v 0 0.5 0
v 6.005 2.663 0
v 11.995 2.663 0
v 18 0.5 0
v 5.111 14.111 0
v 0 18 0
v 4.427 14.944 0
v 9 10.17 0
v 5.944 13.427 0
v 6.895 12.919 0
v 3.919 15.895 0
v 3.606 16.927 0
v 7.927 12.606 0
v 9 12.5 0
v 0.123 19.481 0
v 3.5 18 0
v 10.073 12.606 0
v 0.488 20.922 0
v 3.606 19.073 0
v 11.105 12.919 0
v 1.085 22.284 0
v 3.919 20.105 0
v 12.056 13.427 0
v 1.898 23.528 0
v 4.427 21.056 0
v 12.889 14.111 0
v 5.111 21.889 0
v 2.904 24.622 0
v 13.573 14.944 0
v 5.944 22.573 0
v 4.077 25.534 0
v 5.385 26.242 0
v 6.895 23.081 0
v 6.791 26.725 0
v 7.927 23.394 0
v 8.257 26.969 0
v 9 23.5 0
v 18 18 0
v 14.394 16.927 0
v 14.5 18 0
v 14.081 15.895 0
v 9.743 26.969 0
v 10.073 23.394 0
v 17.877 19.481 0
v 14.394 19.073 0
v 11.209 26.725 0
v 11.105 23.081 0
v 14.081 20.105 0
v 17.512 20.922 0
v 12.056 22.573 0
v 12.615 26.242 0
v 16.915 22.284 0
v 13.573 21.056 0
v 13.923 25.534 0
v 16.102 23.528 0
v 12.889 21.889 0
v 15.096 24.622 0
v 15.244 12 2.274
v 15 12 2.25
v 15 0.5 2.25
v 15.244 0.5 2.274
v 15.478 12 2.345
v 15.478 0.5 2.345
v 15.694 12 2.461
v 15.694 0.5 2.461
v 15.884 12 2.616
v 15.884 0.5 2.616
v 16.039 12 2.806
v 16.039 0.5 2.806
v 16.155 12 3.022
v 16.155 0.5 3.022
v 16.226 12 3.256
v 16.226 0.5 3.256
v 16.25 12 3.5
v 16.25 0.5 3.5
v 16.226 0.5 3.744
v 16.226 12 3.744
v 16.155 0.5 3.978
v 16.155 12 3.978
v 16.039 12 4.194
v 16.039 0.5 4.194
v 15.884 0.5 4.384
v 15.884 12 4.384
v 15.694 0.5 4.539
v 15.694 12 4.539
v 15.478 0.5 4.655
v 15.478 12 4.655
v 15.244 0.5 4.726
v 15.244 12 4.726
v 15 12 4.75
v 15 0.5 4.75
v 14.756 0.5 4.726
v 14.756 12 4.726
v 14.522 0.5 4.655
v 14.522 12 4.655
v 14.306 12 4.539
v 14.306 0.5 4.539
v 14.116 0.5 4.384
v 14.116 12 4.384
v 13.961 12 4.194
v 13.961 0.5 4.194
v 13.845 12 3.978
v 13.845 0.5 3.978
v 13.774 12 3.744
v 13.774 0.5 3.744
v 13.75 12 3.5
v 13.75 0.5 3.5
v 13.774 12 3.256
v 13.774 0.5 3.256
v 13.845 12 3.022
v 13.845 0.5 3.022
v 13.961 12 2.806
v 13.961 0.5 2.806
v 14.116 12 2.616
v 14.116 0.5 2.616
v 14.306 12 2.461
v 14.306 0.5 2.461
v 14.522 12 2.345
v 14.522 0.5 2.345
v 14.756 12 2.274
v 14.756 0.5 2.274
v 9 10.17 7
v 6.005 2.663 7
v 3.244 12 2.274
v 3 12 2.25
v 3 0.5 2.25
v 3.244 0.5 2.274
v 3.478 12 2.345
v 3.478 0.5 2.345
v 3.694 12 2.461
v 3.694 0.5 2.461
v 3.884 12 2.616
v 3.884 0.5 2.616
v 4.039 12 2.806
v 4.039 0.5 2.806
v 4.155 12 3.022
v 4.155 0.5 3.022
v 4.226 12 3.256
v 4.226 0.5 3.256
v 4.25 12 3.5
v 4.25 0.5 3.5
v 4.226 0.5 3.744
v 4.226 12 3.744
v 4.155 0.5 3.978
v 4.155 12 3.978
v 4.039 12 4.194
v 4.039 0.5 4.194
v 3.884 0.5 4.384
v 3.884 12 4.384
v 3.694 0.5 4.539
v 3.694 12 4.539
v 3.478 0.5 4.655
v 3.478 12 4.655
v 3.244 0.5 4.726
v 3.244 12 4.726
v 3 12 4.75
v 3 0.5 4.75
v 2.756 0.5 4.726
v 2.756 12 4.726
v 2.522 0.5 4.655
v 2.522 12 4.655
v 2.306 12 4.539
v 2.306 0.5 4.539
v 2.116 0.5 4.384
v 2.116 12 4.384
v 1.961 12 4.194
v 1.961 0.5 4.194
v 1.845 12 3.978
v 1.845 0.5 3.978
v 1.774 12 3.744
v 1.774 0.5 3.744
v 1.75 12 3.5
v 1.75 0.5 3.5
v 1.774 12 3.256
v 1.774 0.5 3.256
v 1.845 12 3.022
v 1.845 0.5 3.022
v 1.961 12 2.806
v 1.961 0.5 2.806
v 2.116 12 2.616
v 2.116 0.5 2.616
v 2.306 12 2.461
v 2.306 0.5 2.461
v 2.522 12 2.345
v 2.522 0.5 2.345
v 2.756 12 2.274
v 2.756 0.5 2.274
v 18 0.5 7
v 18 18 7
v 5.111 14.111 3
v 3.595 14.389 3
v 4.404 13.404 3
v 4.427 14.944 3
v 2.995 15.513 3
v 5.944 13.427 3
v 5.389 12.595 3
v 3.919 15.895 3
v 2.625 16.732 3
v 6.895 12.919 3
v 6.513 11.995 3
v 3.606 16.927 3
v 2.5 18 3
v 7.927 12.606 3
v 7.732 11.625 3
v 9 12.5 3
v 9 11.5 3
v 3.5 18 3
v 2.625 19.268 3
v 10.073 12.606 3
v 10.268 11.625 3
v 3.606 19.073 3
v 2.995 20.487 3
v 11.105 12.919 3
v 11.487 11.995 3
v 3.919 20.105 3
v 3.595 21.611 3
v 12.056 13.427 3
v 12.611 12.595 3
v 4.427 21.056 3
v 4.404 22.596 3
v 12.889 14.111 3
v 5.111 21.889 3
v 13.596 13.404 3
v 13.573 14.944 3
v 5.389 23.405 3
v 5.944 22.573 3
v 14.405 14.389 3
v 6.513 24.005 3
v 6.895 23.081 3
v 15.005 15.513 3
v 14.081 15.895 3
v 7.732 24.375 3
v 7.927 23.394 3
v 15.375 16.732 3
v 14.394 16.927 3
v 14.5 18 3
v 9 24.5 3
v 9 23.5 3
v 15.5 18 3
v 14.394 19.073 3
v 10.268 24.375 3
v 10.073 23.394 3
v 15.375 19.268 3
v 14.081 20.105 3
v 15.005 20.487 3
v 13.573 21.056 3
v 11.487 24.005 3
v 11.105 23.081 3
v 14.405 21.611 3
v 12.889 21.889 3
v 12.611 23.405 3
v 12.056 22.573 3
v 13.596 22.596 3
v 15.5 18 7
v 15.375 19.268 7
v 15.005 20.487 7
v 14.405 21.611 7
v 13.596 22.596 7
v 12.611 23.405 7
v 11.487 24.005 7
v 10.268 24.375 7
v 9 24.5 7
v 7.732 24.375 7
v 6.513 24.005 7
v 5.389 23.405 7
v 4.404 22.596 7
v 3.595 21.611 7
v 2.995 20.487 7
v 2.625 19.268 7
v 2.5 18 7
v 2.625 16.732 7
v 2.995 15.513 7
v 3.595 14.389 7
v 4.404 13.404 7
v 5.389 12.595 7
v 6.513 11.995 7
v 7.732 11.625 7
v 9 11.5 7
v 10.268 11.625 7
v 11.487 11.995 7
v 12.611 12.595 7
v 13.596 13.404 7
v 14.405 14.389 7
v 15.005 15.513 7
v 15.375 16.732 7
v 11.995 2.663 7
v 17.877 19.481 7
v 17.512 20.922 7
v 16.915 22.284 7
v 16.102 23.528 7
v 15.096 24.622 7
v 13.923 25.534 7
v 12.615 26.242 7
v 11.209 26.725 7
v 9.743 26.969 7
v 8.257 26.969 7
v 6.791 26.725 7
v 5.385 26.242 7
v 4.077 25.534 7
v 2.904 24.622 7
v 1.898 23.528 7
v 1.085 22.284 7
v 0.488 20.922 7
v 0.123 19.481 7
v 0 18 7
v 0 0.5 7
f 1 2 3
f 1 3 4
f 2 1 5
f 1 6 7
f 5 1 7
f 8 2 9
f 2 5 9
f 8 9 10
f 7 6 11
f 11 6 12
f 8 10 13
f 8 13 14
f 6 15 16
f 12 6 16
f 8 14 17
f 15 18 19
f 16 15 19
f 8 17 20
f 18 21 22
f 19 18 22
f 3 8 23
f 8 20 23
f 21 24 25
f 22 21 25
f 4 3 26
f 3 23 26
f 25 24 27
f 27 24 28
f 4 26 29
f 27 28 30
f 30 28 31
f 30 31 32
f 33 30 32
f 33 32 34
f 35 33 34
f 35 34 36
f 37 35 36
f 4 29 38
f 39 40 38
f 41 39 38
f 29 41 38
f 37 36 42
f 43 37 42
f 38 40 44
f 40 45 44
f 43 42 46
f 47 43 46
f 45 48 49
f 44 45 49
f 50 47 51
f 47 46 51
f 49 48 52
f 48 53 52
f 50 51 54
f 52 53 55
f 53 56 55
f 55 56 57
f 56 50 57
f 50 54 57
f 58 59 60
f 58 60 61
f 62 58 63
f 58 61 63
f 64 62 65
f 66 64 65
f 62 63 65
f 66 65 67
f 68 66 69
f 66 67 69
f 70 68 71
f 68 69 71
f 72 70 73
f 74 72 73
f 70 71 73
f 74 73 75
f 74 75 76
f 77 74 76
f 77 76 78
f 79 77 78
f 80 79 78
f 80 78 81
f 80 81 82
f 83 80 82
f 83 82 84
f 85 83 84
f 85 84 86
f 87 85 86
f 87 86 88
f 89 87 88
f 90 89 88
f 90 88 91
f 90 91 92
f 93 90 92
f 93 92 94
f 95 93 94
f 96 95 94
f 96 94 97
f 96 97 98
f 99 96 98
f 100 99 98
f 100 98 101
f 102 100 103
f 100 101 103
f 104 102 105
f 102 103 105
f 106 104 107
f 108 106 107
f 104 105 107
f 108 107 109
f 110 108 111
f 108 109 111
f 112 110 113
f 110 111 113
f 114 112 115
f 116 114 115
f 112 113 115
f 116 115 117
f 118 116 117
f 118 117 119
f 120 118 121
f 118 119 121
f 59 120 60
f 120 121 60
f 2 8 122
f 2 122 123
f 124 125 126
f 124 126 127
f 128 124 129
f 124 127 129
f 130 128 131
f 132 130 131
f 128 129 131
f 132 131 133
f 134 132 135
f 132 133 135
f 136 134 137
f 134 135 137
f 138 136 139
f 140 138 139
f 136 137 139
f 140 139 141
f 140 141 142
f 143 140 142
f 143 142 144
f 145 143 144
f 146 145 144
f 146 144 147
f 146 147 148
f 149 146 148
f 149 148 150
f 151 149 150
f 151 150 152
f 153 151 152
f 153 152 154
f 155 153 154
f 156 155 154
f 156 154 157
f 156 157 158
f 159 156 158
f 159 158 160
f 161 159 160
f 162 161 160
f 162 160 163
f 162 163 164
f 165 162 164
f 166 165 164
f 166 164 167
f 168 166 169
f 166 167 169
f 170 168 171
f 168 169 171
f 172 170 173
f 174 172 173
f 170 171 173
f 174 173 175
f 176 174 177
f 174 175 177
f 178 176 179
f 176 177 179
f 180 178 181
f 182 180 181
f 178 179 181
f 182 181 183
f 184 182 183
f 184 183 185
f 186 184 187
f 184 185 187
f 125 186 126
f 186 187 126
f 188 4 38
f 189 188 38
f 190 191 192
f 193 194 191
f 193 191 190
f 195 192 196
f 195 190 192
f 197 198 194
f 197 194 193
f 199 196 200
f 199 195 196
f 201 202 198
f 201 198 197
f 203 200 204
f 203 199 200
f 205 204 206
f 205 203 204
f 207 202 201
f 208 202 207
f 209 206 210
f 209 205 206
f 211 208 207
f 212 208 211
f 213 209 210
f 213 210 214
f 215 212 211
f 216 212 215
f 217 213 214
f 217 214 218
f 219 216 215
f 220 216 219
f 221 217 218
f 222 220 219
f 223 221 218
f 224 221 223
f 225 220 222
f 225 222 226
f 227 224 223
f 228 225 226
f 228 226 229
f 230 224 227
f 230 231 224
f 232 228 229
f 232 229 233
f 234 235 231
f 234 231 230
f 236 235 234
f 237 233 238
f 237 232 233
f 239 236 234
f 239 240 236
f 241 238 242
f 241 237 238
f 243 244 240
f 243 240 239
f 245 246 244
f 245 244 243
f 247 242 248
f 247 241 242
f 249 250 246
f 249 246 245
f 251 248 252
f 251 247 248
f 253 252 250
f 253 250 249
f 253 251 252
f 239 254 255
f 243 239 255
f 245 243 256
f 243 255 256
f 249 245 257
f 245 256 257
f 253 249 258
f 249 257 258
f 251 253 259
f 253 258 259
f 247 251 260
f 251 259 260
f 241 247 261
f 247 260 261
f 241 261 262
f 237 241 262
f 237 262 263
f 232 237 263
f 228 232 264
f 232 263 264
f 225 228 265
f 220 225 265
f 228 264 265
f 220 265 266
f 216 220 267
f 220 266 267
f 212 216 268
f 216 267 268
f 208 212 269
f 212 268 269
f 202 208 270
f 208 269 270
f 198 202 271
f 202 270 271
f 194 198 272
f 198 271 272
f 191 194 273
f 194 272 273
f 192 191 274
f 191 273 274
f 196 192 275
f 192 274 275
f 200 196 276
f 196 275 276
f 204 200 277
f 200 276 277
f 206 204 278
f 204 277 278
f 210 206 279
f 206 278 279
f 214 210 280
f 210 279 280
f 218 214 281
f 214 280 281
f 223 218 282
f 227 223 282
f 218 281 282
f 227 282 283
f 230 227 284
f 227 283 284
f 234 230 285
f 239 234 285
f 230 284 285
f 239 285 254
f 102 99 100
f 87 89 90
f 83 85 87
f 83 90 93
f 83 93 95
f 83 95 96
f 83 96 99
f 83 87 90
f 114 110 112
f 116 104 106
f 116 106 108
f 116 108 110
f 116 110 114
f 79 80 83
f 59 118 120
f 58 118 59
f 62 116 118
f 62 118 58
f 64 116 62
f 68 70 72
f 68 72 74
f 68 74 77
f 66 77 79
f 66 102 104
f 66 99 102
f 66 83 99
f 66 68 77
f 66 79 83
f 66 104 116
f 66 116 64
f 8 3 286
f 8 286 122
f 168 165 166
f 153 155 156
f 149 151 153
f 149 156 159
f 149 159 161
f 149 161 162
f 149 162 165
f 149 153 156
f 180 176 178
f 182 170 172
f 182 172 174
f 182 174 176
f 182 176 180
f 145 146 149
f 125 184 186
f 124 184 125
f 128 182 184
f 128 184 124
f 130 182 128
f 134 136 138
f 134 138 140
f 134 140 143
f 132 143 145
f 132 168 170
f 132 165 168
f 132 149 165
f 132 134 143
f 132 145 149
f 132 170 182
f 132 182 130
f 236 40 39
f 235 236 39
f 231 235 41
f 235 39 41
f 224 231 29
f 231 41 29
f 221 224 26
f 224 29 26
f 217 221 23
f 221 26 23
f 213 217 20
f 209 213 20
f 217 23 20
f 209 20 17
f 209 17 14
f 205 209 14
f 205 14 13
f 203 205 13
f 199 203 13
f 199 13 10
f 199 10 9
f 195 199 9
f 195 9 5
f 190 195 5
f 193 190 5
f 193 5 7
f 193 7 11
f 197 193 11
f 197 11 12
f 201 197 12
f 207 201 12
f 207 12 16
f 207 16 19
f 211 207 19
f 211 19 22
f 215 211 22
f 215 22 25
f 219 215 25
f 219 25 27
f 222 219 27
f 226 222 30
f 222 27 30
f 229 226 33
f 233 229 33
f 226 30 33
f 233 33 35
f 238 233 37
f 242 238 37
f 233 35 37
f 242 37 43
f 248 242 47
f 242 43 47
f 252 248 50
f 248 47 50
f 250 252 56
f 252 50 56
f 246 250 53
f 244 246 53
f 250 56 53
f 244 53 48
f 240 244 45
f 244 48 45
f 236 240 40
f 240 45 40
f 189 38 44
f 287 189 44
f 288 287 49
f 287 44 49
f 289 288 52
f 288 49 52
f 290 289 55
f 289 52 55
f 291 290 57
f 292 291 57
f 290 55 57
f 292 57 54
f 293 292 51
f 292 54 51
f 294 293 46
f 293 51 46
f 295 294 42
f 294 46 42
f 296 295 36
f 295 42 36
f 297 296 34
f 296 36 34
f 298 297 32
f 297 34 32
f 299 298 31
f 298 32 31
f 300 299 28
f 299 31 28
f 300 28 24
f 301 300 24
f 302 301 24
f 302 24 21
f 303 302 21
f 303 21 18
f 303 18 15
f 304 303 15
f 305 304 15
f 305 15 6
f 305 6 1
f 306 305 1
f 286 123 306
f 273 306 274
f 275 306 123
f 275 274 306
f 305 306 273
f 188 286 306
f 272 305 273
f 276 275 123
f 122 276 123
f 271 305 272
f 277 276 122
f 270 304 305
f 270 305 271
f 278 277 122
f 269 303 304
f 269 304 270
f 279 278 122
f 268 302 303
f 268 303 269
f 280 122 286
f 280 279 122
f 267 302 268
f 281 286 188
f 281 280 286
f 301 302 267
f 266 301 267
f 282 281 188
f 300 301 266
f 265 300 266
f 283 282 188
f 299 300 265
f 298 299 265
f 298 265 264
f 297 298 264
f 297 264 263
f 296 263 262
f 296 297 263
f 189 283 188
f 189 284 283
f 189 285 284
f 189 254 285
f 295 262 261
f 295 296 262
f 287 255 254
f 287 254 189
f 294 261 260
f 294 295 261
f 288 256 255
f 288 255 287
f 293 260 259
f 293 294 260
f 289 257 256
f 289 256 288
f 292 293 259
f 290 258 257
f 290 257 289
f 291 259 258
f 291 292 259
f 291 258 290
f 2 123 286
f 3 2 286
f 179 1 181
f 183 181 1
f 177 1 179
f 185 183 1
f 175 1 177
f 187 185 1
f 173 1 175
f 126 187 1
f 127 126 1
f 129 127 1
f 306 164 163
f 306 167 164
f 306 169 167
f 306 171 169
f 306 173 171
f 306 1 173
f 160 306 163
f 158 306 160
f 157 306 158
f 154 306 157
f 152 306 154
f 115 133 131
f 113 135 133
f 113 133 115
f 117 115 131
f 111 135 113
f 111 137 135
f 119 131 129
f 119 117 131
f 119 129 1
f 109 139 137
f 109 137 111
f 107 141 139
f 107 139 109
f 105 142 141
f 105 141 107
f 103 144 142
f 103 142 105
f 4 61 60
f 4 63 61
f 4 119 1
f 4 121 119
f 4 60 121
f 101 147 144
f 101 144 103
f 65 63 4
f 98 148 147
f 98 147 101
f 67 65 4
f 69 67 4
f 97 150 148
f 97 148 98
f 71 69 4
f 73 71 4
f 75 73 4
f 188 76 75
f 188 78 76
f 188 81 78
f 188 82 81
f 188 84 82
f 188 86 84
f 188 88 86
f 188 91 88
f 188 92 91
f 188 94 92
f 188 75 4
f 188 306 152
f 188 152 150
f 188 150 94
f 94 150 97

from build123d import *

# Parameters (mm, degrees)
BOSS_EXTRUDE1_DEPTH = 7
SKETCH2_R           = 1.25
CUT_EXTRUDE1_DEPTH  = 12
SKETCH3_R           = 6.5
CUT_EXTRUDE2_DEPTH  = 4
SKETCH4_W           = 18
SKETCH4_H           = 7
CUT_EXTRUDE3_DEPTH  = 0.5
CUT_EXTRUDE5_DEPTH  = 10


with BuildPart() as part:
    # Sketch1 → Boss-Extrude1 (new body)
    with BuildSketch(Plane.XY):
        with BuildLine():
            ThreePointArc((18, 18), (9, 27), (0, 18))
            Line((0, 18), (3.5, 18))
            ThreePointArc((3.5, 18), (9, 23.5), (14.5, 18))
            Line((14.5, 18), (18, 18))
        make_face()
        with BuildLine():
            Line((3.5, 18), (0, 18))
            ThreePointArc((0, 18), (9, 9), (18, 18))
            Line((18, 18), (14.5, 18))
            ThreePointArc((14.5, 18), (9, 12.5), (3.5, 18))
        make_face()
        with BuildLine():
            Line((0, 18), (0, 0))
            Line((0, 0), (18, 0))
            Line((18, 0), (18, 18))
            ThreePointArc((18, 18), (9, 9), (0, 18))
        make_face()
    extrude(amount=BOSS_EXTRUDE1_DEPTH)

    # Sketch2 → Cut-Extrude1 (cut)
    with BuildSketch(Plane.XZ):
        with Locations(Location((15, 3.5, 0), (0, 0, 270))):
            Circle(SKETCH2_R)
        with Locations(Location((3, 3.5, 0), (0, 0, 270))):
            Circle(SKETCH2_R)
    extrude(amount=-CUT_EXTRUDE1_DEPTH, mode=Mode.SUBTRACT)

    # Sketch3 → Cut-Extrude2 (cut)
    with BuildSketch(Plane.XY.offset(7)):
        with Locations((9, 18)):
            Circle(SKETCH3_R)
    extrude(amount=-CUT_EXTRUDE2_DEPTH, mode=Mode.SUBTRACT)

    # Sketch4 → Cut-Extrude3 (cut)
    with BuildSketch(Plane.XZ):
        with Locations((9, 3.5)):
            Rectangle(SKETCH4_W, SKETCH4_H)
    extrude(amount=-CUT_EXTRUDE3_DEPTH, mode=Mode.SUBTRACT)

    # Sketch5 → Cut-Extrude5 (cut)
    with BuildSketch(Plane(origin=(0, 0, 0), x_dir=(-1, 0, 0), z_dir=(0, 0, -1))):
        Polygon((-9, 10.170210674), (-6.004587273, 2.662945465), (-11.995412727, 2.662945465), align=None)
    extrude(amount=-CUT_EXTRUDE5_DEPTH, mode=Mode.SUBTRACT)


solid = part.part
